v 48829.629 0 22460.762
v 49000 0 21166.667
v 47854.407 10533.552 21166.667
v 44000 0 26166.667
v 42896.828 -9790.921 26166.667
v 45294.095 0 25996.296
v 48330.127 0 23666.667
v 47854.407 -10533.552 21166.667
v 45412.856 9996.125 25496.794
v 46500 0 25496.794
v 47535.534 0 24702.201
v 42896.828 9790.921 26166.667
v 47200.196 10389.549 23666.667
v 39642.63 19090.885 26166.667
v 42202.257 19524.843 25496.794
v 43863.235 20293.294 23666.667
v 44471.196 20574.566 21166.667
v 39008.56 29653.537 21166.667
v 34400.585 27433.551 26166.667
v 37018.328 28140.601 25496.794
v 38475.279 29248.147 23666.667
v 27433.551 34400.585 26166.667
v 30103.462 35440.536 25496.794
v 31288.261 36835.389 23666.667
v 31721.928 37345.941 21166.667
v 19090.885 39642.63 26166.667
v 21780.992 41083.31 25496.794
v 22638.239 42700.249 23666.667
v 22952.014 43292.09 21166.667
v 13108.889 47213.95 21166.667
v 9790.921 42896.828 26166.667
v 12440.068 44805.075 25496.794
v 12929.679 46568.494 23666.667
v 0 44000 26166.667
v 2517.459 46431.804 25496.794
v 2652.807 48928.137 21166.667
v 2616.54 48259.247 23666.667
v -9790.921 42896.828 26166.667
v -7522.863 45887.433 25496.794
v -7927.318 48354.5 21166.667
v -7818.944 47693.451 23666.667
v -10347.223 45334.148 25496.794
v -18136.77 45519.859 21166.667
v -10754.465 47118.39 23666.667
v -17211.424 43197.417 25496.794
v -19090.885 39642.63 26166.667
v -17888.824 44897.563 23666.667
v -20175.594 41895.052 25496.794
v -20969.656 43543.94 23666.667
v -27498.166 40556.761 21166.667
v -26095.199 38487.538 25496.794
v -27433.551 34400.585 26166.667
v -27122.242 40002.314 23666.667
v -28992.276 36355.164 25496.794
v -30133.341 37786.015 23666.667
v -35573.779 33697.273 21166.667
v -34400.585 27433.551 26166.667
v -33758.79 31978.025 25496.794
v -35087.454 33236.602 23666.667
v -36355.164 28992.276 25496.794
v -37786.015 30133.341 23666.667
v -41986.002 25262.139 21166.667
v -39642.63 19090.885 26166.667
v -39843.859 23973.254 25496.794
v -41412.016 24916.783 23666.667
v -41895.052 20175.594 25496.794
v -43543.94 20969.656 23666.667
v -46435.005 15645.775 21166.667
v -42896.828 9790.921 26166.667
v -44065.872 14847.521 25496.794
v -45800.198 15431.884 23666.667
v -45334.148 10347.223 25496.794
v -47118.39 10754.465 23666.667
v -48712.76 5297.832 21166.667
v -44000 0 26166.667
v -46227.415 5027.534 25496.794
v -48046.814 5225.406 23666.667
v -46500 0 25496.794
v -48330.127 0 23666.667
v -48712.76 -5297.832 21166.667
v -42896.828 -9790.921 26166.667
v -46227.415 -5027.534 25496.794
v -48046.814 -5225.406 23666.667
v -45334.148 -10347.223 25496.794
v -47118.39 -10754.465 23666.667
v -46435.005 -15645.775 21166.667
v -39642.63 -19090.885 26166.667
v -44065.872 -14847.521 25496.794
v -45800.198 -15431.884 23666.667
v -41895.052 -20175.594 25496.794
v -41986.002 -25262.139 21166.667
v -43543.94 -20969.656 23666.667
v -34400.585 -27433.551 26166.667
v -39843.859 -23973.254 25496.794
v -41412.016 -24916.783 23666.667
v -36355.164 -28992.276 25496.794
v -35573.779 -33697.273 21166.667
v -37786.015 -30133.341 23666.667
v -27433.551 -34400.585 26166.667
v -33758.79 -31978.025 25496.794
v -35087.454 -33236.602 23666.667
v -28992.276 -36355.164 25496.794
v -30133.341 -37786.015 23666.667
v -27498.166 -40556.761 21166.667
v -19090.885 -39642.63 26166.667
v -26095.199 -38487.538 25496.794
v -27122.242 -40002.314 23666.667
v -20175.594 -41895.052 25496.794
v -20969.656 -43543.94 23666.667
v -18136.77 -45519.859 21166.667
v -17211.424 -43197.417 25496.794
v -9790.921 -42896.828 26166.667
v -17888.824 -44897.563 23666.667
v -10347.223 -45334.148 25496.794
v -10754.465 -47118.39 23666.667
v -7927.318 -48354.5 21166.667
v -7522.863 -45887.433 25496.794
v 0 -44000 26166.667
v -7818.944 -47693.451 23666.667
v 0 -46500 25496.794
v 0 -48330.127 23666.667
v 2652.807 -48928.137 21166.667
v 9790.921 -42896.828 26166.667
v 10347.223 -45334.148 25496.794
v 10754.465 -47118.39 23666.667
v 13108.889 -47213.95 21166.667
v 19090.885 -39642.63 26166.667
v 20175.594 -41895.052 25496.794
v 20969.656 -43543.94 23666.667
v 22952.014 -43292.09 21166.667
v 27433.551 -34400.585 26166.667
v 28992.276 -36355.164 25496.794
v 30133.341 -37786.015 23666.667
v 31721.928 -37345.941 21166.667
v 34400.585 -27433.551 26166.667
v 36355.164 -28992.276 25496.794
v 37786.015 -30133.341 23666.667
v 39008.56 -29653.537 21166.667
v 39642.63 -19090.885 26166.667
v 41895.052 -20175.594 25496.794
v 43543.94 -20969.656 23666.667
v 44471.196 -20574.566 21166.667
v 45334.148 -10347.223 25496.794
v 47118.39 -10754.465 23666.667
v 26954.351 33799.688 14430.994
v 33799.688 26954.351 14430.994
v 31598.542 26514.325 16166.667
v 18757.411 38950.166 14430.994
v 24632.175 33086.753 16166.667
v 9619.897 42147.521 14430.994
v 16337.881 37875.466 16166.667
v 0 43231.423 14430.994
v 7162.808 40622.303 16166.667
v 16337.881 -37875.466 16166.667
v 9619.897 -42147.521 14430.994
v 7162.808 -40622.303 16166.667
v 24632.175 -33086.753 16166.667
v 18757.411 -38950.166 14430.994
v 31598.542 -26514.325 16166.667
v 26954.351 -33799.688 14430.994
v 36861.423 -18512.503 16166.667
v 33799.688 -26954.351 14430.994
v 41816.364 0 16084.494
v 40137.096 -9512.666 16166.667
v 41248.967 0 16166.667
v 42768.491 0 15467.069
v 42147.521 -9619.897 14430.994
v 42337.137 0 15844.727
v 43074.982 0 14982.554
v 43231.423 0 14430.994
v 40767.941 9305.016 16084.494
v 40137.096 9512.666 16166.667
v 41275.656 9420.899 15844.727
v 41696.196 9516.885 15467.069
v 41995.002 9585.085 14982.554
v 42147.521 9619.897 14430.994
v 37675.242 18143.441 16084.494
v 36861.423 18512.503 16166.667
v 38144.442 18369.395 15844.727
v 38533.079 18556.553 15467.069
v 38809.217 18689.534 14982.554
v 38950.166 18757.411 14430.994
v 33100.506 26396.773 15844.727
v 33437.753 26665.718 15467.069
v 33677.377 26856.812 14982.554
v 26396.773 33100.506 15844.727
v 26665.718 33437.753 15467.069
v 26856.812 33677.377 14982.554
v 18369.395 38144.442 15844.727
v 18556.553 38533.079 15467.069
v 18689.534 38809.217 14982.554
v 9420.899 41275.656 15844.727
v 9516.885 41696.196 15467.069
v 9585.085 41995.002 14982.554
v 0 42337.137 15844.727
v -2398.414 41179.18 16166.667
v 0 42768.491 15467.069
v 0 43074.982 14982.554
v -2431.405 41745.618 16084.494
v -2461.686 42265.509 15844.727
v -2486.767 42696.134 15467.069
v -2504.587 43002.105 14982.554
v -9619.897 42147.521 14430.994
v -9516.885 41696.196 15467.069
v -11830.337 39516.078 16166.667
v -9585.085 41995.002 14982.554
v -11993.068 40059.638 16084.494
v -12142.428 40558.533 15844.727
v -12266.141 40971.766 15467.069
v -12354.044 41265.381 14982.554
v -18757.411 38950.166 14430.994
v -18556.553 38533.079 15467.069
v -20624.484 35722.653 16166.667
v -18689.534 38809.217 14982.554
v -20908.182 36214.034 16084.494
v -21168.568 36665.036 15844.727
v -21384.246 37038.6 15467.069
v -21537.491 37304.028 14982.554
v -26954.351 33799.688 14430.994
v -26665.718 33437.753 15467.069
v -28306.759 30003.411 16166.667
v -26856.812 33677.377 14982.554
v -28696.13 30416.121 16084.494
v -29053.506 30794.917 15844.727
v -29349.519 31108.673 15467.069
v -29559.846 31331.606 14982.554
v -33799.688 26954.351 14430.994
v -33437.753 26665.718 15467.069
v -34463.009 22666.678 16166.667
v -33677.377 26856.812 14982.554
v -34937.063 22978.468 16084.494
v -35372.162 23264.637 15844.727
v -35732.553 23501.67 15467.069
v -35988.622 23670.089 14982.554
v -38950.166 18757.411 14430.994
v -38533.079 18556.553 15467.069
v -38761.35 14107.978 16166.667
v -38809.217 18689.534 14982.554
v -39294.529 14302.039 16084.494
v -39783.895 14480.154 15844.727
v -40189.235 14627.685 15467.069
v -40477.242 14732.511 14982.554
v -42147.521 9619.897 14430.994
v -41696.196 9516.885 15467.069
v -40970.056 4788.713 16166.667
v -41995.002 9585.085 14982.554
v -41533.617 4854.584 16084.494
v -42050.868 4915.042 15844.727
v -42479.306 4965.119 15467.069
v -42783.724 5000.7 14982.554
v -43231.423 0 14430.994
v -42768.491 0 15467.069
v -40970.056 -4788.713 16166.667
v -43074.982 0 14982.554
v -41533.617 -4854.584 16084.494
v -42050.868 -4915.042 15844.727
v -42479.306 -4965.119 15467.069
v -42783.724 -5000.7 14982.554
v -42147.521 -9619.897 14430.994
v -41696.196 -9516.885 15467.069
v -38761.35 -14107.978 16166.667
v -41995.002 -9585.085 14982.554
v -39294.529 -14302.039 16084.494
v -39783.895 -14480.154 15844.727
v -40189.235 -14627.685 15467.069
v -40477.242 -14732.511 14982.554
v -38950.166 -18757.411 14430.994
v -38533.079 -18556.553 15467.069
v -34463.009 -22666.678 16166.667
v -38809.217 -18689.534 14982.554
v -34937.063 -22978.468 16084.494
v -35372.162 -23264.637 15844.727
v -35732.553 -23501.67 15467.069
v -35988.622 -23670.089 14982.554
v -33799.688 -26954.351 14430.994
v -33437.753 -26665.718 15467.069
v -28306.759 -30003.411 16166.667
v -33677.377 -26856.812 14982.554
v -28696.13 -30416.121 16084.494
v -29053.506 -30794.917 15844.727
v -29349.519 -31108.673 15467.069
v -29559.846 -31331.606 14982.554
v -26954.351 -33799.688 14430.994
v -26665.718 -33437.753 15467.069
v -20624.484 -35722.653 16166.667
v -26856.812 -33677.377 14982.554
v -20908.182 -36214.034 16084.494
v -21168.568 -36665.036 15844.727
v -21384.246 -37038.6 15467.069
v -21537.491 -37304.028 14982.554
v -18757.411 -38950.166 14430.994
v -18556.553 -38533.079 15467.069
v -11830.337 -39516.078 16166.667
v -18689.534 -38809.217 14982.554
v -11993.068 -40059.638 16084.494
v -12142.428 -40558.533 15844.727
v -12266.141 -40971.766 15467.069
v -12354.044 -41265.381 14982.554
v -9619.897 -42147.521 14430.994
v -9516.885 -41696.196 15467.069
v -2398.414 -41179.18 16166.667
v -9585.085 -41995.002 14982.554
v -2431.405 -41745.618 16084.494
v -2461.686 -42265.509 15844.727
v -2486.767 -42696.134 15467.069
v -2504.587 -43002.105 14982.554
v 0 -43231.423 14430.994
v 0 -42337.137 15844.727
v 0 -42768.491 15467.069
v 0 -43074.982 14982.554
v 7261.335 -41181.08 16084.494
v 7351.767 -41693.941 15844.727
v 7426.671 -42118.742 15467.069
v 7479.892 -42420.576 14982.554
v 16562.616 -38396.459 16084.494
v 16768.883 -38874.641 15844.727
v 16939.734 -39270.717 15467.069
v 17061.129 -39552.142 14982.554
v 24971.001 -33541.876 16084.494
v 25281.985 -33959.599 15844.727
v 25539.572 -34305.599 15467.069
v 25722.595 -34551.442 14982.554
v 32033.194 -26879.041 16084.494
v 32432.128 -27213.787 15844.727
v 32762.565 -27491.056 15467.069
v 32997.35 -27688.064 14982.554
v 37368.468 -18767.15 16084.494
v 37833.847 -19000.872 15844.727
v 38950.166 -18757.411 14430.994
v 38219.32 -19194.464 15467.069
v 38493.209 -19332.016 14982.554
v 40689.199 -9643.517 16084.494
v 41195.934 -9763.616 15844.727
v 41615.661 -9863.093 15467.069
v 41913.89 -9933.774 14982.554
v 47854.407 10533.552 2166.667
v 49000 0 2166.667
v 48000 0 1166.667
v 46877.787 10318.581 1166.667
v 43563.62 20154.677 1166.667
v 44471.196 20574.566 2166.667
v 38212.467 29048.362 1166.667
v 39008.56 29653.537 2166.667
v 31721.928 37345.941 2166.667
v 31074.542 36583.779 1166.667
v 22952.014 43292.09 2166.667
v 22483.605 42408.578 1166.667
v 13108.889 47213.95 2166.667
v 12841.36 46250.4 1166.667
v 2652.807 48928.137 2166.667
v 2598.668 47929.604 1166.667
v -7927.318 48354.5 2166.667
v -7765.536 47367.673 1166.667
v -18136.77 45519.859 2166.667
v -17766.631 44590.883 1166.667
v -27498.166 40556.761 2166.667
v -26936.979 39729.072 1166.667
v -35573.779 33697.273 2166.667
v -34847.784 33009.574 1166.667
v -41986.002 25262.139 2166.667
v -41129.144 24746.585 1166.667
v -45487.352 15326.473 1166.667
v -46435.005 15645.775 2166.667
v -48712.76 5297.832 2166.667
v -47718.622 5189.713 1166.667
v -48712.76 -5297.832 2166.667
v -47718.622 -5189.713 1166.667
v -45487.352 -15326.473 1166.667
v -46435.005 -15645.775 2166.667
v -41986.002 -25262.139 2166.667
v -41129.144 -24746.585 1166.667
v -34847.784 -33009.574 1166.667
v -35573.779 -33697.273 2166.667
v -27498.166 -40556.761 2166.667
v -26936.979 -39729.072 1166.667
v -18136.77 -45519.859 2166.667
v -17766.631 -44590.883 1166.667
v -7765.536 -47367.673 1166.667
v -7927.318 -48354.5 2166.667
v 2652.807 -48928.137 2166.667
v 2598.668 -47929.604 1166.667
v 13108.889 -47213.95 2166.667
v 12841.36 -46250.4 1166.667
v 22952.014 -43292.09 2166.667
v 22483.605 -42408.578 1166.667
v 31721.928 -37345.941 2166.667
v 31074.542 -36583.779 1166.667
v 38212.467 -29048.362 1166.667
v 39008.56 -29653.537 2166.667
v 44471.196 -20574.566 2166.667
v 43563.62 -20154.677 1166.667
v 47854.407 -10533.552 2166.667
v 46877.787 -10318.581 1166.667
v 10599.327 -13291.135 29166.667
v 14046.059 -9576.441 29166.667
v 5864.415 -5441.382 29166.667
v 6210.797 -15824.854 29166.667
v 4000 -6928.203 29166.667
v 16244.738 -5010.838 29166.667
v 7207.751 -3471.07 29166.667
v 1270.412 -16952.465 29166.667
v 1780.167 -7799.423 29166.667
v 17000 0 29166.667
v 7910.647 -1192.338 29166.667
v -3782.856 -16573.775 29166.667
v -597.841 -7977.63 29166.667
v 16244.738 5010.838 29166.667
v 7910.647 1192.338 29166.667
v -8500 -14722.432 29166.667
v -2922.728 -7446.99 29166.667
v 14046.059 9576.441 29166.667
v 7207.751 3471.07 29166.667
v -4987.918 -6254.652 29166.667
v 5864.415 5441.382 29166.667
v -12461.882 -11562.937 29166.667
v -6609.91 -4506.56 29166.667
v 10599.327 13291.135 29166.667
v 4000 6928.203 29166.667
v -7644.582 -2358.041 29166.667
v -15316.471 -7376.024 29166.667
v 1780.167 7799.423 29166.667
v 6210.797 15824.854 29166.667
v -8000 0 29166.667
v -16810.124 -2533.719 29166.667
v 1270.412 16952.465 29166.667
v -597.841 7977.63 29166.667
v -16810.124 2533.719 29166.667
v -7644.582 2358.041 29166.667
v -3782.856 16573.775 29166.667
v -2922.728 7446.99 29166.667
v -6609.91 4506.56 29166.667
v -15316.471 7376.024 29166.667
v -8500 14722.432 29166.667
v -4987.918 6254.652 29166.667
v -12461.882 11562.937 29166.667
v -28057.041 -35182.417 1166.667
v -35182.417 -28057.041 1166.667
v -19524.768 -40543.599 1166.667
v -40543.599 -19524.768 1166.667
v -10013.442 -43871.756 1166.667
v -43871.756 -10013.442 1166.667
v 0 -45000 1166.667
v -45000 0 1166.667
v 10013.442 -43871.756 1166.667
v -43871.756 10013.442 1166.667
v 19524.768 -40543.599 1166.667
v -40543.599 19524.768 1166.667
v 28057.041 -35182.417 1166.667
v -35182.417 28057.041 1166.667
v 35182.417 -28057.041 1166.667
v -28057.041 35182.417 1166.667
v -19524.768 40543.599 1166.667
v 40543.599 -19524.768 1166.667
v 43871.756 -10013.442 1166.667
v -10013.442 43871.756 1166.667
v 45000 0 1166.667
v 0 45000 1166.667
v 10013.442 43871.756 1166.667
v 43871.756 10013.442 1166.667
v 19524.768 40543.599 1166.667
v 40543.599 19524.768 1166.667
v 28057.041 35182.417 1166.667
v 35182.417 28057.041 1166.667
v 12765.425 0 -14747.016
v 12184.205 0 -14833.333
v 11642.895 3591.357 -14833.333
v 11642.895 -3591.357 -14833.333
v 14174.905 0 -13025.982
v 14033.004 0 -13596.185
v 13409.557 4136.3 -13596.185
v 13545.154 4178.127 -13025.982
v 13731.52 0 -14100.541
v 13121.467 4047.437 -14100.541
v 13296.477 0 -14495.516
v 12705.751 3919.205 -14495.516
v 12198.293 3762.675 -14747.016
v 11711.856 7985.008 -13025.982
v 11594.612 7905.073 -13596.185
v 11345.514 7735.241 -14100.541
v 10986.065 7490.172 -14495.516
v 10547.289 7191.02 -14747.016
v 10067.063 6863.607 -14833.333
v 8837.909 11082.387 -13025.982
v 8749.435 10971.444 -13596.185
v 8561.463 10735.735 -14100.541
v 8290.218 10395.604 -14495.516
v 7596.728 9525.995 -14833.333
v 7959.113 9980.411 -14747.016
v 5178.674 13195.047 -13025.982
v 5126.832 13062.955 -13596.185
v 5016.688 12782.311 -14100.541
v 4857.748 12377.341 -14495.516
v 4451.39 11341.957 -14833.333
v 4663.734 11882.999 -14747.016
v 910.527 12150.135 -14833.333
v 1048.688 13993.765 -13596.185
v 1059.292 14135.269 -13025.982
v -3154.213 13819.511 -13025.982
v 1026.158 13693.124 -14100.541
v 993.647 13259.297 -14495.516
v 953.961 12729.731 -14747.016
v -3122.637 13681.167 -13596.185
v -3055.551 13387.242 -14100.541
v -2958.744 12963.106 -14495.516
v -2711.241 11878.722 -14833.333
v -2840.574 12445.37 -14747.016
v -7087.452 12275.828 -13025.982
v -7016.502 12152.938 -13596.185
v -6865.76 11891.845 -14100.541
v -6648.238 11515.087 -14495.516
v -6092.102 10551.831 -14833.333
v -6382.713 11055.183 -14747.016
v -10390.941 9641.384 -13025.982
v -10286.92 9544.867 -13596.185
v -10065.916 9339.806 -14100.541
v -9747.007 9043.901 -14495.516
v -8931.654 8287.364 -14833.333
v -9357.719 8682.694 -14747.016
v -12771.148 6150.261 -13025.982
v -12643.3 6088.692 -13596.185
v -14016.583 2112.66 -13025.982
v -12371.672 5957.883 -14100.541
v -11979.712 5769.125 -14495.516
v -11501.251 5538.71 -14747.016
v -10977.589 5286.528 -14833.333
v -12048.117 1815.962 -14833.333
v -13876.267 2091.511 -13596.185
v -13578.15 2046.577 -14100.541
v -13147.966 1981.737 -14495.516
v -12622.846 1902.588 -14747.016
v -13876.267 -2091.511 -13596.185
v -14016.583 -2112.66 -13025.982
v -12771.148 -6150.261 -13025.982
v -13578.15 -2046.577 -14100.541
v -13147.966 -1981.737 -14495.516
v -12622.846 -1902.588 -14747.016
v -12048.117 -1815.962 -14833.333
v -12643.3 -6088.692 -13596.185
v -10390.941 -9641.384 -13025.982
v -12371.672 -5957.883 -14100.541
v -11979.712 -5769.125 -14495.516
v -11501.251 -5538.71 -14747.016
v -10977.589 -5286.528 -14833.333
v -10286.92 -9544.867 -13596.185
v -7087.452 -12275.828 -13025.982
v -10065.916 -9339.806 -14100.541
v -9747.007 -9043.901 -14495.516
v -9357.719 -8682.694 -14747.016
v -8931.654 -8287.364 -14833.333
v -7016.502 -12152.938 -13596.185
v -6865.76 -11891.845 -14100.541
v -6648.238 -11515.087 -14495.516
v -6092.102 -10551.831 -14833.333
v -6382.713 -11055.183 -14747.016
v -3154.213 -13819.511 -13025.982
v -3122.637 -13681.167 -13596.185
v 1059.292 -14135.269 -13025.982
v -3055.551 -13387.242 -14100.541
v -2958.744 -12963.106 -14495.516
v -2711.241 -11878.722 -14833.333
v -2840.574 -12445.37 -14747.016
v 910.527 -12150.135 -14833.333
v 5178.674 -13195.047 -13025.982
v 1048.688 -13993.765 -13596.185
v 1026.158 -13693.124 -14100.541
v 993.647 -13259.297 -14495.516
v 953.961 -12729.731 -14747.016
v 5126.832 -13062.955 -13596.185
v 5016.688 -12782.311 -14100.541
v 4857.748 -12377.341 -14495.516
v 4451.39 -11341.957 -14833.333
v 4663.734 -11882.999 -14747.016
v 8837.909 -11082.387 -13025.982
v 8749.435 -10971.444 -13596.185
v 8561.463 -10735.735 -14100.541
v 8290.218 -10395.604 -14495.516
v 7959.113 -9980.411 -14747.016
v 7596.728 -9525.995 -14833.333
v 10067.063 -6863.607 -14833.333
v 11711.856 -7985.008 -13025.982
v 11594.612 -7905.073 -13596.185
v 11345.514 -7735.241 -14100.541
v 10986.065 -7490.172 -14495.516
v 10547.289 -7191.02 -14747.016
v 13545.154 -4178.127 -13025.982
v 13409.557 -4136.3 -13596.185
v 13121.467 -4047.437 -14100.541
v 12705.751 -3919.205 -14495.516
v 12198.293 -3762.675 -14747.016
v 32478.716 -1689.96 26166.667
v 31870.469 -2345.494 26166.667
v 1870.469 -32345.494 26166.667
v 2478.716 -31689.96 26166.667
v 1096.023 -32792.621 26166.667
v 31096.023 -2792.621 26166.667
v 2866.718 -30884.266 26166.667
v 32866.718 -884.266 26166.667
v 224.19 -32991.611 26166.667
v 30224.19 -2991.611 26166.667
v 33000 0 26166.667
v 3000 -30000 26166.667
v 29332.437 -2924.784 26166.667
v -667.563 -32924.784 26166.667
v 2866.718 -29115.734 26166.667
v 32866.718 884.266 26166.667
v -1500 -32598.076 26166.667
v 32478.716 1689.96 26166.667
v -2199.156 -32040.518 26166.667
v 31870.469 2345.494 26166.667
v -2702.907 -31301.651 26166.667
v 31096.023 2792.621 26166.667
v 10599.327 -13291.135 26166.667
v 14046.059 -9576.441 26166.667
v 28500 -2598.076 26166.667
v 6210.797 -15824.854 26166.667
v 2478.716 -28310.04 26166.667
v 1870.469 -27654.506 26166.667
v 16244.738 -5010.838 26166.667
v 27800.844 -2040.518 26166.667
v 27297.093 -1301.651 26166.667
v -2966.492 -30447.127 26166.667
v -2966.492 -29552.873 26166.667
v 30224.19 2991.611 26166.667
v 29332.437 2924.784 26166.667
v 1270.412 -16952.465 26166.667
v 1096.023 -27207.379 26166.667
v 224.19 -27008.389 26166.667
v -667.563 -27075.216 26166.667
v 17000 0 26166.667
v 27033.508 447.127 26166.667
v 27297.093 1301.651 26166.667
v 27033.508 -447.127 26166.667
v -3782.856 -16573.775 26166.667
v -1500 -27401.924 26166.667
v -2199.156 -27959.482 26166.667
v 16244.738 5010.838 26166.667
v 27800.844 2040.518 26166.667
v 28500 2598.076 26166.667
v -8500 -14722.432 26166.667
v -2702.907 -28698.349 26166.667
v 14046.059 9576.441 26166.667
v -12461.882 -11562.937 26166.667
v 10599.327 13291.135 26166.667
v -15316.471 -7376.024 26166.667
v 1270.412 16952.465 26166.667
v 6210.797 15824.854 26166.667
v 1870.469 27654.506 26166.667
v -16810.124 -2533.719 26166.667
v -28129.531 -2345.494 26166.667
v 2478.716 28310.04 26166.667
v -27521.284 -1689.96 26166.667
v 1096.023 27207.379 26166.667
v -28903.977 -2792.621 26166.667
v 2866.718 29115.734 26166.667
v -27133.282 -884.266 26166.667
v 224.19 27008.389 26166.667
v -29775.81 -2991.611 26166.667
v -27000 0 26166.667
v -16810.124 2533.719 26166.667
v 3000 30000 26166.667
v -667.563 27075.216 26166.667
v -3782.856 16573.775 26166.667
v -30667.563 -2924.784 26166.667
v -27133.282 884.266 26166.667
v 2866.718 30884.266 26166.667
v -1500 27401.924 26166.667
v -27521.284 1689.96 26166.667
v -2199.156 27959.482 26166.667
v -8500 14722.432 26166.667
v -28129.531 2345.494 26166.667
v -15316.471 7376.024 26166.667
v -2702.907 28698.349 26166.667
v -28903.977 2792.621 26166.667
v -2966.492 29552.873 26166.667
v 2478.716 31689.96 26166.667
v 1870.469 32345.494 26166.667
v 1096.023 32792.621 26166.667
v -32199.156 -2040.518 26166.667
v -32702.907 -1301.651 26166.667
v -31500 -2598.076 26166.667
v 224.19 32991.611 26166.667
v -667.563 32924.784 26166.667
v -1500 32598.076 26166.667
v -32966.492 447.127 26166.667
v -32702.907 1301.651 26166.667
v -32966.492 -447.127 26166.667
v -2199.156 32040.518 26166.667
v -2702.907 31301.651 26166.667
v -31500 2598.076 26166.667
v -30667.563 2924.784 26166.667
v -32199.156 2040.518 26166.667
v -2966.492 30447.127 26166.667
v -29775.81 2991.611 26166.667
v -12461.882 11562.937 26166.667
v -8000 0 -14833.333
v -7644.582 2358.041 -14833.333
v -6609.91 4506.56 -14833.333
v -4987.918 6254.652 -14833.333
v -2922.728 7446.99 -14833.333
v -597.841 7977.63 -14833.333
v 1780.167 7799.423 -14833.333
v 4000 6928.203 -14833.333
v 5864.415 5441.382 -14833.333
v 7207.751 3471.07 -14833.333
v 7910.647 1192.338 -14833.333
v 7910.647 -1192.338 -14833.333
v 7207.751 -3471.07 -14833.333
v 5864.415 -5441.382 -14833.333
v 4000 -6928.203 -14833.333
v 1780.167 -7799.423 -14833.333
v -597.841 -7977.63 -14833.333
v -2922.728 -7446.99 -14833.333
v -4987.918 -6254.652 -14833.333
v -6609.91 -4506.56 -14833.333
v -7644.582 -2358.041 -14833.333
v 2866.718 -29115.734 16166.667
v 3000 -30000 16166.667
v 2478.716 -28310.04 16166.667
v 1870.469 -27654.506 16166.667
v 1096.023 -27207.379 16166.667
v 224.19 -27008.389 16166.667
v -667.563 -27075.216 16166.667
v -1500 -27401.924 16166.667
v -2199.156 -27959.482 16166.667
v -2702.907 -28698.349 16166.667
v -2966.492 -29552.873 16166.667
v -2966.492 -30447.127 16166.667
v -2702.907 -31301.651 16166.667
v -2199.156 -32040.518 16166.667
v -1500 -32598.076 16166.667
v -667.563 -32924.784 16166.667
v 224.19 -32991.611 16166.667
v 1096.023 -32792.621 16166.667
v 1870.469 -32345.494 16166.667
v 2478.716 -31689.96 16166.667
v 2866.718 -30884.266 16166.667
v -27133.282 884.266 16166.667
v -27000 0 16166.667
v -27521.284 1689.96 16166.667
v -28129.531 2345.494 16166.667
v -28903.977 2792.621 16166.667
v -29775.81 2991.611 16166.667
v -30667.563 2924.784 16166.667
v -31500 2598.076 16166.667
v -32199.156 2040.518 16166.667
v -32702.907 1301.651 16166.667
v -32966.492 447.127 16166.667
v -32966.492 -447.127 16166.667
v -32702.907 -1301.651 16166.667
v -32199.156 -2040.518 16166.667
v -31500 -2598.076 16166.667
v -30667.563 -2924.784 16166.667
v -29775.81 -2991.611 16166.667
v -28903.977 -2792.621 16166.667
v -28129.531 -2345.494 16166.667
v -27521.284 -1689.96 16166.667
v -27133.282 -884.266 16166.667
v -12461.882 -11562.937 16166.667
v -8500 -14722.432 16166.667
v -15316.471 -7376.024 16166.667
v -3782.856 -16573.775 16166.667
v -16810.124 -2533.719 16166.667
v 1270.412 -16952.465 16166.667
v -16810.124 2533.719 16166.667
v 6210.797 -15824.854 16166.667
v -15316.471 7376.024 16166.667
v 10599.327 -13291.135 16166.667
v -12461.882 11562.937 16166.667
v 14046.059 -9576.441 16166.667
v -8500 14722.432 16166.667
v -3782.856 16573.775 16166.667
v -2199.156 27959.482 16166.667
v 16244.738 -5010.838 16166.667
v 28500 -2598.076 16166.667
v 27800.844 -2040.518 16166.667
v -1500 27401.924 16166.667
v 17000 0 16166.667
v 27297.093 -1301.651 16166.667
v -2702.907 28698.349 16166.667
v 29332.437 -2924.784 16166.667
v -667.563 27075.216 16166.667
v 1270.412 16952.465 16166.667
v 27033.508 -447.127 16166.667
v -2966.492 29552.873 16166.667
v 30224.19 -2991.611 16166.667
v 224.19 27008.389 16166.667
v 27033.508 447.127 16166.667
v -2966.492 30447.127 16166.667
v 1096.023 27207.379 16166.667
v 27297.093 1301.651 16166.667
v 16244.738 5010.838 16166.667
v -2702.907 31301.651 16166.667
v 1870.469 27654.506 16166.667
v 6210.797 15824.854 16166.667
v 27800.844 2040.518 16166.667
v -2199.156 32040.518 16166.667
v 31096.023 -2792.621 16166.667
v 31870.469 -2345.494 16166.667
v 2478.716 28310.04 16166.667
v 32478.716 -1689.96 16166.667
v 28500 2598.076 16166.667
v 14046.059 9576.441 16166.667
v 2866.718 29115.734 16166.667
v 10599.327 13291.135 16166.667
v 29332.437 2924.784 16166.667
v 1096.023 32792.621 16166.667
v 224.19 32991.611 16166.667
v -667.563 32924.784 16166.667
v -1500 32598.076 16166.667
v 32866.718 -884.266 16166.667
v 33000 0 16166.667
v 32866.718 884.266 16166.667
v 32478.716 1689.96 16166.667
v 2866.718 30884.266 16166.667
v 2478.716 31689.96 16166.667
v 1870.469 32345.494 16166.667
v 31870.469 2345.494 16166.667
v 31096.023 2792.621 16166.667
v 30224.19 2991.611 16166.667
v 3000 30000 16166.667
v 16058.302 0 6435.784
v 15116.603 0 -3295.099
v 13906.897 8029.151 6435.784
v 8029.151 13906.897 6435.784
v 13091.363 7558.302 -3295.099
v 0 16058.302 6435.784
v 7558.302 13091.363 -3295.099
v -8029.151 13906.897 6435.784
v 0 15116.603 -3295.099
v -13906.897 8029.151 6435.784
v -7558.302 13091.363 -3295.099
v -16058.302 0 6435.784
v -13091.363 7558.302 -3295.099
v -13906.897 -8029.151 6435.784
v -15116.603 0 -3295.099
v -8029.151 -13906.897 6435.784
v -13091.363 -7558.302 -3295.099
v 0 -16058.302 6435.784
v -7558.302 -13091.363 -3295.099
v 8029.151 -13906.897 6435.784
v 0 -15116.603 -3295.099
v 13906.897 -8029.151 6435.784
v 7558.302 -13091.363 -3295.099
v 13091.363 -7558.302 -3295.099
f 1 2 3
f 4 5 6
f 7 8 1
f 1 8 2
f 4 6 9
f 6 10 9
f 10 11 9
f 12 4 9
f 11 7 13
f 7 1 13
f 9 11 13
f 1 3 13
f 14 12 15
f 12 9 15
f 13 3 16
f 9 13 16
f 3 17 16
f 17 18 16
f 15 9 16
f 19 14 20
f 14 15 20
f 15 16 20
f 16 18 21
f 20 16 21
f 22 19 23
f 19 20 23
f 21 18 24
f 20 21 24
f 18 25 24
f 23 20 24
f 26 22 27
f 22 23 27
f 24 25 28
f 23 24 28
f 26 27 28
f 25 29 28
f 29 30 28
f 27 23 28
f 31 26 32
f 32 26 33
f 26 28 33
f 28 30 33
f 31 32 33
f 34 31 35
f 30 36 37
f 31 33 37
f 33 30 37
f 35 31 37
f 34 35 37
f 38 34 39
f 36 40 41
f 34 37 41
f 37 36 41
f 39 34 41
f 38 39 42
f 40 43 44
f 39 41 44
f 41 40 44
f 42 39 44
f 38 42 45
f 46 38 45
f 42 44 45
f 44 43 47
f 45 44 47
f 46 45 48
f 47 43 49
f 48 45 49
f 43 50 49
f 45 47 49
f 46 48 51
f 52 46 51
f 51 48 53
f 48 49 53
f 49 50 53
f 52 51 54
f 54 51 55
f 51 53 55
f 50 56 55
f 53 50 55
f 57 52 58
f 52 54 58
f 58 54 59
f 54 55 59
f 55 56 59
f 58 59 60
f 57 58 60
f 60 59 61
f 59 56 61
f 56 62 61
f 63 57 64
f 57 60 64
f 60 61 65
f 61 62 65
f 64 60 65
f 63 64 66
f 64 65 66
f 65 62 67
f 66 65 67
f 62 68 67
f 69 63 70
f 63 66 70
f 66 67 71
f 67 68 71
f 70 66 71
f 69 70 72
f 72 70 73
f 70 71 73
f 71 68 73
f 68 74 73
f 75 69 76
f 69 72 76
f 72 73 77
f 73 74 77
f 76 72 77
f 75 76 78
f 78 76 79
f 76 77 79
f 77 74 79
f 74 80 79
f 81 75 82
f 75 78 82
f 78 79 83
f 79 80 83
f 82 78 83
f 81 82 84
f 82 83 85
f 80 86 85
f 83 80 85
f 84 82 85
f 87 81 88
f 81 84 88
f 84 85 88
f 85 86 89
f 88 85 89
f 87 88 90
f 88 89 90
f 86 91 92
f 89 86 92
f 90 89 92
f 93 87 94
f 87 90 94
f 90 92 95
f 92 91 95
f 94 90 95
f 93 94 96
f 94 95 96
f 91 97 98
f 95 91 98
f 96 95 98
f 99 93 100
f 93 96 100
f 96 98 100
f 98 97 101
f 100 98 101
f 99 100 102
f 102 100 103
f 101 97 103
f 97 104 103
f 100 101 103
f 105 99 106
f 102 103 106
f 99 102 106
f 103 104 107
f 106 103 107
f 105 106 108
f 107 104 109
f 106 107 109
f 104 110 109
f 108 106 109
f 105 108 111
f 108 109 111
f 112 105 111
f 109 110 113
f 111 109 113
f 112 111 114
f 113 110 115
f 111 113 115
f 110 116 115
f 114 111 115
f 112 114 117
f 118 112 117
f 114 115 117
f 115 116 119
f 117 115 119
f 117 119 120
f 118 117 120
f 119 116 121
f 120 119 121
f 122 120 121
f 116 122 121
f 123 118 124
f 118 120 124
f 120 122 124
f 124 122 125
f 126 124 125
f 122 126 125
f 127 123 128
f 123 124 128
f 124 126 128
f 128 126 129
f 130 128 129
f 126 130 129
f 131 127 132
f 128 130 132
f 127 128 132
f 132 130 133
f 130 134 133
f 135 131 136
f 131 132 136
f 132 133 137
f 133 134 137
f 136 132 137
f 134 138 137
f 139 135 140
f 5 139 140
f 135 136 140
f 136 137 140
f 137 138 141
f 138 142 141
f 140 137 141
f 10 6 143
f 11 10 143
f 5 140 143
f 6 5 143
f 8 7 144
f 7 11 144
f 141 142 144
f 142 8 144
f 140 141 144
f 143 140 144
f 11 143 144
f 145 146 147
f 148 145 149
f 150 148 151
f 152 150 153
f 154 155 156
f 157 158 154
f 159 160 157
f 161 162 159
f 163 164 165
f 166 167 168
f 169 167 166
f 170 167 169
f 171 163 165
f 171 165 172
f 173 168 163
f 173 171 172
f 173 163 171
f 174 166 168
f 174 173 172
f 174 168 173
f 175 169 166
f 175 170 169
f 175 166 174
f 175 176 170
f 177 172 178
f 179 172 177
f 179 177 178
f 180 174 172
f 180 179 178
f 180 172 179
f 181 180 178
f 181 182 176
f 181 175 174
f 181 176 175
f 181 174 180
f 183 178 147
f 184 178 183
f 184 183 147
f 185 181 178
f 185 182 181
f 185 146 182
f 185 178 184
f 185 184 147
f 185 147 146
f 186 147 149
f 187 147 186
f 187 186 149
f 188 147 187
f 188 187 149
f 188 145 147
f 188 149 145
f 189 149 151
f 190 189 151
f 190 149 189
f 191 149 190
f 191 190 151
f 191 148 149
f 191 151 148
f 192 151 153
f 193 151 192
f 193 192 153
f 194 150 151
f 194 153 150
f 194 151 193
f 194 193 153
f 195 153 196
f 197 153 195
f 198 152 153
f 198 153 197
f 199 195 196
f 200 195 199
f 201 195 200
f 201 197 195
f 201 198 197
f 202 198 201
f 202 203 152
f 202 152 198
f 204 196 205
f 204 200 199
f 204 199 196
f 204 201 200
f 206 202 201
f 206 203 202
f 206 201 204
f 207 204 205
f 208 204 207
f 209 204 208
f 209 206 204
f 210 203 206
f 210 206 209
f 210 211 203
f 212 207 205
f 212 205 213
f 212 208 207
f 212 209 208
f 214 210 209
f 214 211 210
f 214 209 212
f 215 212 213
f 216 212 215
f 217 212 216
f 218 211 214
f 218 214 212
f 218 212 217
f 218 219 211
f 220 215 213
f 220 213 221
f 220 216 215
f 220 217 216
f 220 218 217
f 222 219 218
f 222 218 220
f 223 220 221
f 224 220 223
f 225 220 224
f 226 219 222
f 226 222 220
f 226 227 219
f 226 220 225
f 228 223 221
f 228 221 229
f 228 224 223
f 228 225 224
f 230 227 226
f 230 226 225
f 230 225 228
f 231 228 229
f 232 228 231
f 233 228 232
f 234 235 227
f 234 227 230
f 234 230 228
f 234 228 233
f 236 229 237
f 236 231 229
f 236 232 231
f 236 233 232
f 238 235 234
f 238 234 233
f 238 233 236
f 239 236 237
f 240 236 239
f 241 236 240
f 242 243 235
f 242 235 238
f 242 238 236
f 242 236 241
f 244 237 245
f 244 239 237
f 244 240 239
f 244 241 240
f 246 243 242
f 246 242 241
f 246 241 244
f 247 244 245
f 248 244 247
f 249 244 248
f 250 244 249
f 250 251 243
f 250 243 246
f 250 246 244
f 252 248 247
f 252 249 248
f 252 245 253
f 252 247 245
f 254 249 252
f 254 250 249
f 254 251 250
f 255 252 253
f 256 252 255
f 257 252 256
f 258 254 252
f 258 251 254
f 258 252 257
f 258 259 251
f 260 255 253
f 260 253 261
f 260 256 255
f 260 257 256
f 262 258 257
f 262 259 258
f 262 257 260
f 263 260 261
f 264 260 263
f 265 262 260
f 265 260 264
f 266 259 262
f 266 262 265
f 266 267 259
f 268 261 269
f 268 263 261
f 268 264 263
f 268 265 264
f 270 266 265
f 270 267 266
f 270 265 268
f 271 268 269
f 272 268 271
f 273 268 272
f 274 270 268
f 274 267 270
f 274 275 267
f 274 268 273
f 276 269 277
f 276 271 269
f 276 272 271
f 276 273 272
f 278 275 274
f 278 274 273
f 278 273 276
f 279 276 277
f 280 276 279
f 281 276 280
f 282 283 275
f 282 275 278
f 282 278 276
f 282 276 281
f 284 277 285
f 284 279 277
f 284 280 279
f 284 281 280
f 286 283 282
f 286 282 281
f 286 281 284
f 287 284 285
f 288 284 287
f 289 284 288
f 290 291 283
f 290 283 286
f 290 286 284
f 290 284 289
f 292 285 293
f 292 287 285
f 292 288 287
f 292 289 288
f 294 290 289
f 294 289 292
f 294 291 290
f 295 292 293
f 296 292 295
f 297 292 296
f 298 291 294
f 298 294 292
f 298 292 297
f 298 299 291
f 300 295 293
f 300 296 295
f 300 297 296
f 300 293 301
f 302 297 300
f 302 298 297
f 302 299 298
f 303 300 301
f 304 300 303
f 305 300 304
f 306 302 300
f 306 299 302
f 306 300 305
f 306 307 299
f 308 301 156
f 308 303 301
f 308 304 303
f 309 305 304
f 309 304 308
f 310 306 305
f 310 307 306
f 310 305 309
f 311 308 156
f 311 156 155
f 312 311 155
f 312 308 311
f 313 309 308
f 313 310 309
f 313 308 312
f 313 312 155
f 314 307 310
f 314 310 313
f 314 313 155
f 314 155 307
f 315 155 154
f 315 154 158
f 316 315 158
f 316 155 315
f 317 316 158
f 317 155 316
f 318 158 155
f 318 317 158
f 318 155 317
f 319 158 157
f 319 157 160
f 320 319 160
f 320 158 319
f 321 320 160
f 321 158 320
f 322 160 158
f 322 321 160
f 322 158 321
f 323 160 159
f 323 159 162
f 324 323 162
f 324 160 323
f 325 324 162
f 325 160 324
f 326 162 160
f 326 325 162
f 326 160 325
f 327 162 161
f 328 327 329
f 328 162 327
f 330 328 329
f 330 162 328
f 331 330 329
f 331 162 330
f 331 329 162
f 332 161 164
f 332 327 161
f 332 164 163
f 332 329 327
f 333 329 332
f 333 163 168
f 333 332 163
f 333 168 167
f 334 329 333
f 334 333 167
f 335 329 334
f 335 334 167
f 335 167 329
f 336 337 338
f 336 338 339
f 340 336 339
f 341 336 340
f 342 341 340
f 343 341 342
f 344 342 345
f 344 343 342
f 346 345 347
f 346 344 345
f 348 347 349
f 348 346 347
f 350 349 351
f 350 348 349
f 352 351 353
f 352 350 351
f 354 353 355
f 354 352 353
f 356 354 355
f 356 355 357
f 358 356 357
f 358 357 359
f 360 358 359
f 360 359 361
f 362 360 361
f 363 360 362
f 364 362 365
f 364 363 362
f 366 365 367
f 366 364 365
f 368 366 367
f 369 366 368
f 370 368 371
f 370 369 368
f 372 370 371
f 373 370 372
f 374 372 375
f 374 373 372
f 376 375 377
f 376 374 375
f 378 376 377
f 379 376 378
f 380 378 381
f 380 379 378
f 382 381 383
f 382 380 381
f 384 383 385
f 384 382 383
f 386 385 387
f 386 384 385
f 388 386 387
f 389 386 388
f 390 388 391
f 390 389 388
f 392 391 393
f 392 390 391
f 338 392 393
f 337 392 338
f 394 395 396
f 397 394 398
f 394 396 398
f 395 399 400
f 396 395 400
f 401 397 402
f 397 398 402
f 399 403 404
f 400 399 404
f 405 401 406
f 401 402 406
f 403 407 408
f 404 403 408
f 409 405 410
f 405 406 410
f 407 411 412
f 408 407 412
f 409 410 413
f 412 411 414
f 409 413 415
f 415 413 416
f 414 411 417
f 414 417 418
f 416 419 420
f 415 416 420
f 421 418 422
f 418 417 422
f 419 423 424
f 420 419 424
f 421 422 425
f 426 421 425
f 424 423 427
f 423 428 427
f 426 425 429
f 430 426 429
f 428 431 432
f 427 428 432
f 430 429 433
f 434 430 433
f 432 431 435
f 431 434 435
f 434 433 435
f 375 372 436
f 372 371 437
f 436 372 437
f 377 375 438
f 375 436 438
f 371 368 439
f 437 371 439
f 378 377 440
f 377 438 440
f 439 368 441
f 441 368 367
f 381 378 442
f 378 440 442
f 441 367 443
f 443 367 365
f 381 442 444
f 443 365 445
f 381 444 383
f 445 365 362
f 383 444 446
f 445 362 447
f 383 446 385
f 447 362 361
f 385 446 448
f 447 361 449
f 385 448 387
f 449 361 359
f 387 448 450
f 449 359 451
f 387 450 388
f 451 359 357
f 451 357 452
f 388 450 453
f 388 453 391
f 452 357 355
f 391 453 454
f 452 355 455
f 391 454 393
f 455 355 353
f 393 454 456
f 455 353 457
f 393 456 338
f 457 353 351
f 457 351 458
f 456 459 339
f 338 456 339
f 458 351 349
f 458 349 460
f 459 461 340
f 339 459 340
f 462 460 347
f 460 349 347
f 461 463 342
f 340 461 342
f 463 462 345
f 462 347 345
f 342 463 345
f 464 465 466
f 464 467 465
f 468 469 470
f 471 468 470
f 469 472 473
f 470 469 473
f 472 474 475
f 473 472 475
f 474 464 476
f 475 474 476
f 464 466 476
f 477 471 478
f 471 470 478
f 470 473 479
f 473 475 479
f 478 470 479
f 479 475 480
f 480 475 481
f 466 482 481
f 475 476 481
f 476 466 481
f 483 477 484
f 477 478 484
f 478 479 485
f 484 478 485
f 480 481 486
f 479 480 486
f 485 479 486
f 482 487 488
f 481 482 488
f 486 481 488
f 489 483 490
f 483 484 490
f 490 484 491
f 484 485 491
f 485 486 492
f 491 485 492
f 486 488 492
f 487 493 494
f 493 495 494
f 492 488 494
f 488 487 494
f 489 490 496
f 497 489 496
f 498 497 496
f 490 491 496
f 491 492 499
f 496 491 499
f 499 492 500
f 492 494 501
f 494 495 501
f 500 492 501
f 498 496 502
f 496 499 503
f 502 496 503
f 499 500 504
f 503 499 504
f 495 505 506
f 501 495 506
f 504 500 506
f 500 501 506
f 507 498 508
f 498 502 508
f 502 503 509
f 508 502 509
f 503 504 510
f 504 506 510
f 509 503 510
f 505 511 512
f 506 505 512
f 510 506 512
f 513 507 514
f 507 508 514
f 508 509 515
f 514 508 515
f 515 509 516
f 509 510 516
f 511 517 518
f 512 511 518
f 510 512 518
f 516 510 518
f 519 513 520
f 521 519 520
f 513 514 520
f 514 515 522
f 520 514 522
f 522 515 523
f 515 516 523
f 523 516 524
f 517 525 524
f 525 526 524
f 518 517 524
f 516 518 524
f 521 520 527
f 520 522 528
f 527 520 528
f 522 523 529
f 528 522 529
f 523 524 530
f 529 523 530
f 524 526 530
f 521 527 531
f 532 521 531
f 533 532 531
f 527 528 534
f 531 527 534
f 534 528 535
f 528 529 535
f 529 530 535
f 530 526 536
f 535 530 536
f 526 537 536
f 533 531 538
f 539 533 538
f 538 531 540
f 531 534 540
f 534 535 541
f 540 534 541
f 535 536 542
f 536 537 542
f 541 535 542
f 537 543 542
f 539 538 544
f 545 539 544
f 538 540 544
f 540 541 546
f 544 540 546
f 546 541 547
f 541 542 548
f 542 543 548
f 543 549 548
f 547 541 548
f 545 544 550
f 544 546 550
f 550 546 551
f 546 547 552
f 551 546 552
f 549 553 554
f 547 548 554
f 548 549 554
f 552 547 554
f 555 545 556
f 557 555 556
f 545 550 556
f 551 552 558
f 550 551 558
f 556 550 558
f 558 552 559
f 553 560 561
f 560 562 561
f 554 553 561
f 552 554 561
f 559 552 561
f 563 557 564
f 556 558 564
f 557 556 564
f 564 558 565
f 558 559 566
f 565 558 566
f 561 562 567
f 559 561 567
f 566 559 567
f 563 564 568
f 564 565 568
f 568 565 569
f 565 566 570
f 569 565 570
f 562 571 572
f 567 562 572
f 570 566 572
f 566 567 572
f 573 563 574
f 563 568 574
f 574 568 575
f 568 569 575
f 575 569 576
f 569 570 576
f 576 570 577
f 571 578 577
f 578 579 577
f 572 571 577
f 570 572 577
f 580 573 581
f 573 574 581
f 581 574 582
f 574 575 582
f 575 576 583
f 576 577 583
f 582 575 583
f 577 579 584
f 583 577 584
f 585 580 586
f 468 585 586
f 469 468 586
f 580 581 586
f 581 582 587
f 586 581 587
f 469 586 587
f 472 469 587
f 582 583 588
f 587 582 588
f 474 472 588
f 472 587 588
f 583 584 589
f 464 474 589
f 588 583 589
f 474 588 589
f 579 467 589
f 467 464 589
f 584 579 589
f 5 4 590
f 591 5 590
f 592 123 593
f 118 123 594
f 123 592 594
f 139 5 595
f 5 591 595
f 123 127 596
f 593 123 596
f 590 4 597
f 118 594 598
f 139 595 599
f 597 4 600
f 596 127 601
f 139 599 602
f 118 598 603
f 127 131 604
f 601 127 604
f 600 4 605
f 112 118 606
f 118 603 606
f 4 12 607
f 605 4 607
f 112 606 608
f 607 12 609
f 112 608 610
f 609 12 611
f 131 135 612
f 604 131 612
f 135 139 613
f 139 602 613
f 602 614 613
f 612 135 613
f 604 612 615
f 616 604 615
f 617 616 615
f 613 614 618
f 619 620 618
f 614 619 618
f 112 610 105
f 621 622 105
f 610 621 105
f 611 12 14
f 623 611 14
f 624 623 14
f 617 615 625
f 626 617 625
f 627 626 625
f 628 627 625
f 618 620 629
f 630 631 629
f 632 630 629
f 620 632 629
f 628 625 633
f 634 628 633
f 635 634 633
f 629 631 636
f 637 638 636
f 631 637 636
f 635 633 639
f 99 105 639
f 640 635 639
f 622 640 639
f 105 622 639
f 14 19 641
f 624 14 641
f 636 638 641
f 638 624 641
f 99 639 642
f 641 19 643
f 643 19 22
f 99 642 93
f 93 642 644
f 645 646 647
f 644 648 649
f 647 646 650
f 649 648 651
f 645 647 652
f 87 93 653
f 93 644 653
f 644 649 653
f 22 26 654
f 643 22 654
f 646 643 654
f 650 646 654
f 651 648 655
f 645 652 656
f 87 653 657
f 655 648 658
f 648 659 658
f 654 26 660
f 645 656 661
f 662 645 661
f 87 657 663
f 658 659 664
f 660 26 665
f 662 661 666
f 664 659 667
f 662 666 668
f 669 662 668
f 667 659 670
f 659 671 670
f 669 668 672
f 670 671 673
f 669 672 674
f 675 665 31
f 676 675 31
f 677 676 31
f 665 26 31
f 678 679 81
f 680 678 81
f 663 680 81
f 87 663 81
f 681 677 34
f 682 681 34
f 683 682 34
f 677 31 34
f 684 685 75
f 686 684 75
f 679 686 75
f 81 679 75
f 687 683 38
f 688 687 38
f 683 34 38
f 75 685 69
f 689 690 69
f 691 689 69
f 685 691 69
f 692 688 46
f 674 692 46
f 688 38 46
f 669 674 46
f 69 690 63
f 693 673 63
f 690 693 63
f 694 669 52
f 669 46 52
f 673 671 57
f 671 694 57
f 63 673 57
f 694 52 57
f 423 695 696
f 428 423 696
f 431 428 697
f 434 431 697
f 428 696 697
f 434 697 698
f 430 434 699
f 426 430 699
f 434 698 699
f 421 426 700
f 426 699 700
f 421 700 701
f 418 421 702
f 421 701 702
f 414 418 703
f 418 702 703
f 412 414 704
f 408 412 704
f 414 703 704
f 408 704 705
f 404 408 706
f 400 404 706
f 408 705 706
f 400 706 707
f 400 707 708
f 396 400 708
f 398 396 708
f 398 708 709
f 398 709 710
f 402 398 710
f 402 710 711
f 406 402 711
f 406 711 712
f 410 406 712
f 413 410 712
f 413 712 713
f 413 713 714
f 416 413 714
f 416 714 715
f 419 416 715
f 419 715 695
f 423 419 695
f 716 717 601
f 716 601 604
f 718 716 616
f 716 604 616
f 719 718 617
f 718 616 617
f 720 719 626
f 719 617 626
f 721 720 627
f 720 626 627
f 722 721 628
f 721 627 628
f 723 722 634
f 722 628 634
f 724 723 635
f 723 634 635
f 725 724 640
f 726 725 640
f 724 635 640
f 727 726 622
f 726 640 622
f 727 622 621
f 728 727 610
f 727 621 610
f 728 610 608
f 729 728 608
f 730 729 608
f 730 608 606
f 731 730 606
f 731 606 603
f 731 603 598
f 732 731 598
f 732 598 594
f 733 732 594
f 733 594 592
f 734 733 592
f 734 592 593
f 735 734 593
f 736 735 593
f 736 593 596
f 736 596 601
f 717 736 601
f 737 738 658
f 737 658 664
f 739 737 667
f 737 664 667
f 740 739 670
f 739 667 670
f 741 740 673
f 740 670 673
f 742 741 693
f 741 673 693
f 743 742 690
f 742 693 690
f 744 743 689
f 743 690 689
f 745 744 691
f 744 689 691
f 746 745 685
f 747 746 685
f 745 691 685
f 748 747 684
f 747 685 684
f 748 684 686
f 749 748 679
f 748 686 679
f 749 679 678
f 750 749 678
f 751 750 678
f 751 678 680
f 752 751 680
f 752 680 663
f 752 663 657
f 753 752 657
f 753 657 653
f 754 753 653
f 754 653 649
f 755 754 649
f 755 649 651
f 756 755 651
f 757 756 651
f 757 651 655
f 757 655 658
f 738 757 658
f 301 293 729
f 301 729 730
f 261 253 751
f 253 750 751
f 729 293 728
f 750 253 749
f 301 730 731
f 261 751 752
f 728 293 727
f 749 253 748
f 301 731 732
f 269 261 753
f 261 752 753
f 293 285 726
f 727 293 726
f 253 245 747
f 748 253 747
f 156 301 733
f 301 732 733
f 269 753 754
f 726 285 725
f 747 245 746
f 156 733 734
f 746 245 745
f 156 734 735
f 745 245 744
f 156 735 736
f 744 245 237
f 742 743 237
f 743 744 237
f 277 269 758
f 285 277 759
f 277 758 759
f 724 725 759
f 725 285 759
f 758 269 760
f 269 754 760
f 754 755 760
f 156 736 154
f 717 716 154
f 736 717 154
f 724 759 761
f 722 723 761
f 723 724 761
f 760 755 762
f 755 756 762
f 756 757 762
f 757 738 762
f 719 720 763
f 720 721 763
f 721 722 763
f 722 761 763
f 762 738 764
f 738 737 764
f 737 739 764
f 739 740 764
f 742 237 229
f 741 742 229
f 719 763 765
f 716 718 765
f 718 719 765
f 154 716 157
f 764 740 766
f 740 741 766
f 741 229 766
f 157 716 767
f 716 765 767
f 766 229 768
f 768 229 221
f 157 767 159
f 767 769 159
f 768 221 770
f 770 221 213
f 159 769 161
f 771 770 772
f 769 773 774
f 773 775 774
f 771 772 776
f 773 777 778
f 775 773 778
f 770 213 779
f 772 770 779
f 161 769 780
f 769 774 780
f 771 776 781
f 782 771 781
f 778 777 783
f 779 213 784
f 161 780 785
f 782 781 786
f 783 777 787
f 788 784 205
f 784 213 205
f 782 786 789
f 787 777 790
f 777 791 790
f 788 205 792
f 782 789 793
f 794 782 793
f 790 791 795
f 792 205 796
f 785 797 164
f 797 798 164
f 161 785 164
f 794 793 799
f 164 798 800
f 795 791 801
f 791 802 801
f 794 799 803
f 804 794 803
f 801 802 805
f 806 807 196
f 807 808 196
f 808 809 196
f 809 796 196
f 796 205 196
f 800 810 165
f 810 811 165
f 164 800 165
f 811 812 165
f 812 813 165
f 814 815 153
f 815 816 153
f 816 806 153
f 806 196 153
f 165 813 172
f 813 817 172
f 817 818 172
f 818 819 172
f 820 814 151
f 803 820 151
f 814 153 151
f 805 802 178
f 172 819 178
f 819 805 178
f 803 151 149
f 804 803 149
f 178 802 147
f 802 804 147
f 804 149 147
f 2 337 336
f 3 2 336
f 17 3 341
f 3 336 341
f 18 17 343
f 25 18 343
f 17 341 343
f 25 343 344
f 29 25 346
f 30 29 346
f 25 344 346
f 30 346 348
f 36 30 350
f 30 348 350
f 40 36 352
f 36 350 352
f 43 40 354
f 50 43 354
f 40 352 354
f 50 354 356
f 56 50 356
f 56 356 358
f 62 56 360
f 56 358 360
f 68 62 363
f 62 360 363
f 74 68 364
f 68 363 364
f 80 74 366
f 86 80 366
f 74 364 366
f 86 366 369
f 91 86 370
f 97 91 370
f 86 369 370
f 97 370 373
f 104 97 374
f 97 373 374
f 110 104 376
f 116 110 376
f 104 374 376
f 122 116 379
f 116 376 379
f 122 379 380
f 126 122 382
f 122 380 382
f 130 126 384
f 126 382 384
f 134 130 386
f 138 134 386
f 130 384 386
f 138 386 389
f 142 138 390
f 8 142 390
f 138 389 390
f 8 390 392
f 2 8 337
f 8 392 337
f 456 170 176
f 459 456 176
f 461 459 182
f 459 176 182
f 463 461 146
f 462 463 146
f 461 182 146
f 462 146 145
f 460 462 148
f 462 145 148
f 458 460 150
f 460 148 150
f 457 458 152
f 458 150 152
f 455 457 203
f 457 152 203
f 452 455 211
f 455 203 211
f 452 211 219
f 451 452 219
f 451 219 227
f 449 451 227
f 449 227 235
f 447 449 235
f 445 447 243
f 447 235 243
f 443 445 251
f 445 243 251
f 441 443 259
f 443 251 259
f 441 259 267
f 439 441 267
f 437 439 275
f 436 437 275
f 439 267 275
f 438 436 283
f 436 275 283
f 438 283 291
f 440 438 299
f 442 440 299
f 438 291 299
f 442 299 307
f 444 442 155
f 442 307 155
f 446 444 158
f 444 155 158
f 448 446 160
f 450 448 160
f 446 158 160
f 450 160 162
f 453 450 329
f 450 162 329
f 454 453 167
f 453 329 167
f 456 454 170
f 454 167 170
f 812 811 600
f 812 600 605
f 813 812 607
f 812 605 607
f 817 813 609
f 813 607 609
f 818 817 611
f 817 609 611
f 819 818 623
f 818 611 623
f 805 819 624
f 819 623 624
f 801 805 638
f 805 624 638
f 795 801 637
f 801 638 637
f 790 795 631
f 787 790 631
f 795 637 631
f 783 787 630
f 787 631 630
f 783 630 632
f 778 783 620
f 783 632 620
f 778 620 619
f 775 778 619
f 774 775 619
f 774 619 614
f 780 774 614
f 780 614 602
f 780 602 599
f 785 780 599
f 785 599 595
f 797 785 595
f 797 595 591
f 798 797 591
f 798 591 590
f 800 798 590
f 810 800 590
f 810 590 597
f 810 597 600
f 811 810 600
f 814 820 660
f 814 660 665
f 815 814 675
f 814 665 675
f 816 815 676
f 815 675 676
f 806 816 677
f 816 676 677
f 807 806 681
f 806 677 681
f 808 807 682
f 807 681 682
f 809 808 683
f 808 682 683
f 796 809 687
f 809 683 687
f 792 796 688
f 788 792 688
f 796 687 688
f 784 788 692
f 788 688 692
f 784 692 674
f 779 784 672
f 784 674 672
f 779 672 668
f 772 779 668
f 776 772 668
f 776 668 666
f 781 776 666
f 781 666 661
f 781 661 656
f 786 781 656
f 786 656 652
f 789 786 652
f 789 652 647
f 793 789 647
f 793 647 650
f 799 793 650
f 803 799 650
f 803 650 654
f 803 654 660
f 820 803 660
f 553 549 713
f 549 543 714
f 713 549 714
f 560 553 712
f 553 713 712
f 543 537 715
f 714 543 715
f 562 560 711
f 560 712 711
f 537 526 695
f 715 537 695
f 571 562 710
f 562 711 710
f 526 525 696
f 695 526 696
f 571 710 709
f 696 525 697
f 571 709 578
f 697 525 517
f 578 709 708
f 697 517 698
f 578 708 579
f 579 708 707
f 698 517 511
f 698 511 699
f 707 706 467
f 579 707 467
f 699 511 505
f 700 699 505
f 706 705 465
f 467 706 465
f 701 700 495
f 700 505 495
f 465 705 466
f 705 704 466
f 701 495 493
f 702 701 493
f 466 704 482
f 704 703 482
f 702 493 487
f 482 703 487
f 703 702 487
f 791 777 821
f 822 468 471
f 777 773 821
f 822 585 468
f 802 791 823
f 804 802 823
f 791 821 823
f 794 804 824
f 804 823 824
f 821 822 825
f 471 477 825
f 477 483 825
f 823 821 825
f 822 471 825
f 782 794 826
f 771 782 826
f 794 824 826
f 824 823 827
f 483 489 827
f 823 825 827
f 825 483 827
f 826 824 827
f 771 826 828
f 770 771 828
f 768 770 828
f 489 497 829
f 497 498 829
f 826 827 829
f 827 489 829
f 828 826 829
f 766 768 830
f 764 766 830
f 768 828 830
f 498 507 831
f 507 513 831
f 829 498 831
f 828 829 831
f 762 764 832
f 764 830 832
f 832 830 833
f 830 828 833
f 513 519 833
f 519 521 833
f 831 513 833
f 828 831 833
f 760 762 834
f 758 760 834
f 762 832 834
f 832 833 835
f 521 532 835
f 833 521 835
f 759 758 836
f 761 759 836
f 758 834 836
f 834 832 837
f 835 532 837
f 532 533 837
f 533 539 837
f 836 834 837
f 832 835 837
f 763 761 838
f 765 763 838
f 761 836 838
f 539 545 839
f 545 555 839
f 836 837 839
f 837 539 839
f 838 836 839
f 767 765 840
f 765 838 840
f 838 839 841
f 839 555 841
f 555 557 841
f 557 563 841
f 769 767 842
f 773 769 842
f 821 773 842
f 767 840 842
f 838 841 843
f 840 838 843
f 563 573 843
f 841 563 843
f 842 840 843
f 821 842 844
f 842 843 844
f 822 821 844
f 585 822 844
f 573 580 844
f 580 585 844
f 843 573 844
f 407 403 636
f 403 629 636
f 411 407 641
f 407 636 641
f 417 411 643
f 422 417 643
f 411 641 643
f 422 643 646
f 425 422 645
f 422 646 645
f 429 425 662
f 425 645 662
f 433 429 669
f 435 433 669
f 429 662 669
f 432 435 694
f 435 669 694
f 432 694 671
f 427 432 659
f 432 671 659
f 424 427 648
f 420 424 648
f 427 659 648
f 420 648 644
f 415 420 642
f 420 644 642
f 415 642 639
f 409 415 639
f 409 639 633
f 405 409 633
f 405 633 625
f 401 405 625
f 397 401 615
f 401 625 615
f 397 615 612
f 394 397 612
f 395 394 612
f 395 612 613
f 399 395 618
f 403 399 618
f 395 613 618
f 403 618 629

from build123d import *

# Parameters (mm, degrees)
SKETCH2_R          = 8000
CUT_EXTRUDE1_DEPTH = 50000
SKETCH4_R          = 3000
CUT_EXTRUDE2_DEPTH = 50000
FILLET3_R          = 5000
FILLET4_R          = 2000
FILLET5_R          = 2000
CHAMFER1_SIZE      = 1000


with BuildPart() as part:
    # Sketch1 → Revolve1 (revolve)
    with BuildSketch(Plane(origin=(0, 0, 0), x_dir=(1, 0, 0), z_dir=(0, 1, 0))):
        Polygon((0, -29166.666666667), (17000, -29166.666666667), (17000, -26166.666666667), (49000, -26166.666666667), (49000, -1166.666666667), (45000, -1166.666666667), (43000, -16166.666666667), (17000, -16166.666666667), (14000, 14833.333333333), (0, 14833.333333333), align=None)
    revolve(axis=Axis((0, 0, -29842.077171976), (0, 0, 1)))

    # Sketch2 → Cut-Extrude1 (cut)
    with BuildSketch(Plane(origin=(0, 0, -14833.333333333), x_dir=(-1, 0, 0), z_dir=(0, 0, -1))):
        Circle(SKETCH2_R)
    extrude(amount=-CUT_EXTRUDE1_DEPTH, mode=Mode.SUBTRACT)

    # Sketch4 → Cut-Extrude2 (cut)
    with BuildSketch(Plane.XY.offset(26166.666666667)):
        with Locations((0, 30000)):
            Circle(SKETCH4_R)
        with Locations((30000, 0)):
            Circle(SKETCH4_R)
        with Locations((0, -30000)):
            Circle(SKETCH4_R)
        with Locations((-30000, 0)):
            Circle(SKETCH4_R)
    extrude(amount=-CUT_EXTRUDE2_DEPTH, mode=Mode.SUBTRACT)

    # Fillet3
    fillet3_edges = [part.edges().sort_by_distance(p)[0] for p in [
        (-49000, 0, 26166.666666667),
    ]]
    fillet(fillet3_edges, radius=FILLET3_R)

    # Fillet4
    fillet4_edges = [part.edges().sort_by_distance(p)[0] for p in [
        (-43000, 0, 16166.666666667),
    ]]
    fillet(fillet4_edges, radius=FILLET4_R)

    # Fillet5
    fillet5_edges = [part.edges().sort_by_distance(p)[0] for p in [
        (-14000, 0, -14833.333333333),
    ]]
    fillet(fillet5_edges, radius=FILLET5_R)

    # Chamfer1
    chamfer1_edges = [part.edges().sort_by_distance(p)[0] for p in [
        (-49000, 0, 1166.666666667),
    ]]
    chamfer(chamfer1_edges, length=CHAMFER1_SIZE)


solid = part.part
